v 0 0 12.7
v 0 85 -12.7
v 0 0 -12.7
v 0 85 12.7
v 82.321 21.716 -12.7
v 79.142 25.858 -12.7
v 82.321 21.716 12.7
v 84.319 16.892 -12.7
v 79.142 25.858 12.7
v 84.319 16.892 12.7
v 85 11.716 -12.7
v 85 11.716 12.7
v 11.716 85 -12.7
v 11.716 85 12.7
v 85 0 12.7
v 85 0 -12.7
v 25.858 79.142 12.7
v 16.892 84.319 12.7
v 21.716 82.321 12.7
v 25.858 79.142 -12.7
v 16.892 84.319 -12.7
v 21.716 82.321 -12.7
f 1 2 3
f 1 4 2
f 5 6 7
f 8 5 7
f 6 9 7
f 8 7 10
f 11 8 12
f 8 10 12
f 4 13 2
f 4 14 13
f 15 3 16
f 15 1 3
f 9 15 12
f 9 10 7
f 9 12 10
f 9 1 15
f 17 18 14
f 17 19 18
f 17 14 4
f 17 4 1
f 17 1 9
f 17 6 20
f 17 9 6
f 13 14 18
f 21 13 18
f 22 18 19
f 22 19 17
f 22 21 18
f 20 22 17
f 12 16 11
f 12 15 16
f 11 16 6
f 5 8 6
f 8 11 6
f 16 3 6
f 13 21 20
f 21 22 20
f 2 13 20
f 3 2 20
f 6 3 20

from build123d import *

# Parameters (mm, degrees)
BOSS_EXTRUDE1_DEPTH = 12.7
FILLET1_R           = 20


with BuildPart() as part:
    # Sketch1 → Boss-Extrude1 (new, symmetric)
    with BuildSketch(Plane.XY):
        Polygon((0, 0), (85, 0), (85, 20), (20, 85), (0, 85), align=None)
    extrude(amount=BOSS_EXTRUDE1_DEPTH, both=True)

    # Fillet1
    fillet1_edges = [part.edges().sort_by_distance(p)[0] for p in [
        (20, 85, 0),
        (85, 20, 0),
    ]]
    fillet(fillet1_edges, radius=FILLET1_R)


solid = part.part
